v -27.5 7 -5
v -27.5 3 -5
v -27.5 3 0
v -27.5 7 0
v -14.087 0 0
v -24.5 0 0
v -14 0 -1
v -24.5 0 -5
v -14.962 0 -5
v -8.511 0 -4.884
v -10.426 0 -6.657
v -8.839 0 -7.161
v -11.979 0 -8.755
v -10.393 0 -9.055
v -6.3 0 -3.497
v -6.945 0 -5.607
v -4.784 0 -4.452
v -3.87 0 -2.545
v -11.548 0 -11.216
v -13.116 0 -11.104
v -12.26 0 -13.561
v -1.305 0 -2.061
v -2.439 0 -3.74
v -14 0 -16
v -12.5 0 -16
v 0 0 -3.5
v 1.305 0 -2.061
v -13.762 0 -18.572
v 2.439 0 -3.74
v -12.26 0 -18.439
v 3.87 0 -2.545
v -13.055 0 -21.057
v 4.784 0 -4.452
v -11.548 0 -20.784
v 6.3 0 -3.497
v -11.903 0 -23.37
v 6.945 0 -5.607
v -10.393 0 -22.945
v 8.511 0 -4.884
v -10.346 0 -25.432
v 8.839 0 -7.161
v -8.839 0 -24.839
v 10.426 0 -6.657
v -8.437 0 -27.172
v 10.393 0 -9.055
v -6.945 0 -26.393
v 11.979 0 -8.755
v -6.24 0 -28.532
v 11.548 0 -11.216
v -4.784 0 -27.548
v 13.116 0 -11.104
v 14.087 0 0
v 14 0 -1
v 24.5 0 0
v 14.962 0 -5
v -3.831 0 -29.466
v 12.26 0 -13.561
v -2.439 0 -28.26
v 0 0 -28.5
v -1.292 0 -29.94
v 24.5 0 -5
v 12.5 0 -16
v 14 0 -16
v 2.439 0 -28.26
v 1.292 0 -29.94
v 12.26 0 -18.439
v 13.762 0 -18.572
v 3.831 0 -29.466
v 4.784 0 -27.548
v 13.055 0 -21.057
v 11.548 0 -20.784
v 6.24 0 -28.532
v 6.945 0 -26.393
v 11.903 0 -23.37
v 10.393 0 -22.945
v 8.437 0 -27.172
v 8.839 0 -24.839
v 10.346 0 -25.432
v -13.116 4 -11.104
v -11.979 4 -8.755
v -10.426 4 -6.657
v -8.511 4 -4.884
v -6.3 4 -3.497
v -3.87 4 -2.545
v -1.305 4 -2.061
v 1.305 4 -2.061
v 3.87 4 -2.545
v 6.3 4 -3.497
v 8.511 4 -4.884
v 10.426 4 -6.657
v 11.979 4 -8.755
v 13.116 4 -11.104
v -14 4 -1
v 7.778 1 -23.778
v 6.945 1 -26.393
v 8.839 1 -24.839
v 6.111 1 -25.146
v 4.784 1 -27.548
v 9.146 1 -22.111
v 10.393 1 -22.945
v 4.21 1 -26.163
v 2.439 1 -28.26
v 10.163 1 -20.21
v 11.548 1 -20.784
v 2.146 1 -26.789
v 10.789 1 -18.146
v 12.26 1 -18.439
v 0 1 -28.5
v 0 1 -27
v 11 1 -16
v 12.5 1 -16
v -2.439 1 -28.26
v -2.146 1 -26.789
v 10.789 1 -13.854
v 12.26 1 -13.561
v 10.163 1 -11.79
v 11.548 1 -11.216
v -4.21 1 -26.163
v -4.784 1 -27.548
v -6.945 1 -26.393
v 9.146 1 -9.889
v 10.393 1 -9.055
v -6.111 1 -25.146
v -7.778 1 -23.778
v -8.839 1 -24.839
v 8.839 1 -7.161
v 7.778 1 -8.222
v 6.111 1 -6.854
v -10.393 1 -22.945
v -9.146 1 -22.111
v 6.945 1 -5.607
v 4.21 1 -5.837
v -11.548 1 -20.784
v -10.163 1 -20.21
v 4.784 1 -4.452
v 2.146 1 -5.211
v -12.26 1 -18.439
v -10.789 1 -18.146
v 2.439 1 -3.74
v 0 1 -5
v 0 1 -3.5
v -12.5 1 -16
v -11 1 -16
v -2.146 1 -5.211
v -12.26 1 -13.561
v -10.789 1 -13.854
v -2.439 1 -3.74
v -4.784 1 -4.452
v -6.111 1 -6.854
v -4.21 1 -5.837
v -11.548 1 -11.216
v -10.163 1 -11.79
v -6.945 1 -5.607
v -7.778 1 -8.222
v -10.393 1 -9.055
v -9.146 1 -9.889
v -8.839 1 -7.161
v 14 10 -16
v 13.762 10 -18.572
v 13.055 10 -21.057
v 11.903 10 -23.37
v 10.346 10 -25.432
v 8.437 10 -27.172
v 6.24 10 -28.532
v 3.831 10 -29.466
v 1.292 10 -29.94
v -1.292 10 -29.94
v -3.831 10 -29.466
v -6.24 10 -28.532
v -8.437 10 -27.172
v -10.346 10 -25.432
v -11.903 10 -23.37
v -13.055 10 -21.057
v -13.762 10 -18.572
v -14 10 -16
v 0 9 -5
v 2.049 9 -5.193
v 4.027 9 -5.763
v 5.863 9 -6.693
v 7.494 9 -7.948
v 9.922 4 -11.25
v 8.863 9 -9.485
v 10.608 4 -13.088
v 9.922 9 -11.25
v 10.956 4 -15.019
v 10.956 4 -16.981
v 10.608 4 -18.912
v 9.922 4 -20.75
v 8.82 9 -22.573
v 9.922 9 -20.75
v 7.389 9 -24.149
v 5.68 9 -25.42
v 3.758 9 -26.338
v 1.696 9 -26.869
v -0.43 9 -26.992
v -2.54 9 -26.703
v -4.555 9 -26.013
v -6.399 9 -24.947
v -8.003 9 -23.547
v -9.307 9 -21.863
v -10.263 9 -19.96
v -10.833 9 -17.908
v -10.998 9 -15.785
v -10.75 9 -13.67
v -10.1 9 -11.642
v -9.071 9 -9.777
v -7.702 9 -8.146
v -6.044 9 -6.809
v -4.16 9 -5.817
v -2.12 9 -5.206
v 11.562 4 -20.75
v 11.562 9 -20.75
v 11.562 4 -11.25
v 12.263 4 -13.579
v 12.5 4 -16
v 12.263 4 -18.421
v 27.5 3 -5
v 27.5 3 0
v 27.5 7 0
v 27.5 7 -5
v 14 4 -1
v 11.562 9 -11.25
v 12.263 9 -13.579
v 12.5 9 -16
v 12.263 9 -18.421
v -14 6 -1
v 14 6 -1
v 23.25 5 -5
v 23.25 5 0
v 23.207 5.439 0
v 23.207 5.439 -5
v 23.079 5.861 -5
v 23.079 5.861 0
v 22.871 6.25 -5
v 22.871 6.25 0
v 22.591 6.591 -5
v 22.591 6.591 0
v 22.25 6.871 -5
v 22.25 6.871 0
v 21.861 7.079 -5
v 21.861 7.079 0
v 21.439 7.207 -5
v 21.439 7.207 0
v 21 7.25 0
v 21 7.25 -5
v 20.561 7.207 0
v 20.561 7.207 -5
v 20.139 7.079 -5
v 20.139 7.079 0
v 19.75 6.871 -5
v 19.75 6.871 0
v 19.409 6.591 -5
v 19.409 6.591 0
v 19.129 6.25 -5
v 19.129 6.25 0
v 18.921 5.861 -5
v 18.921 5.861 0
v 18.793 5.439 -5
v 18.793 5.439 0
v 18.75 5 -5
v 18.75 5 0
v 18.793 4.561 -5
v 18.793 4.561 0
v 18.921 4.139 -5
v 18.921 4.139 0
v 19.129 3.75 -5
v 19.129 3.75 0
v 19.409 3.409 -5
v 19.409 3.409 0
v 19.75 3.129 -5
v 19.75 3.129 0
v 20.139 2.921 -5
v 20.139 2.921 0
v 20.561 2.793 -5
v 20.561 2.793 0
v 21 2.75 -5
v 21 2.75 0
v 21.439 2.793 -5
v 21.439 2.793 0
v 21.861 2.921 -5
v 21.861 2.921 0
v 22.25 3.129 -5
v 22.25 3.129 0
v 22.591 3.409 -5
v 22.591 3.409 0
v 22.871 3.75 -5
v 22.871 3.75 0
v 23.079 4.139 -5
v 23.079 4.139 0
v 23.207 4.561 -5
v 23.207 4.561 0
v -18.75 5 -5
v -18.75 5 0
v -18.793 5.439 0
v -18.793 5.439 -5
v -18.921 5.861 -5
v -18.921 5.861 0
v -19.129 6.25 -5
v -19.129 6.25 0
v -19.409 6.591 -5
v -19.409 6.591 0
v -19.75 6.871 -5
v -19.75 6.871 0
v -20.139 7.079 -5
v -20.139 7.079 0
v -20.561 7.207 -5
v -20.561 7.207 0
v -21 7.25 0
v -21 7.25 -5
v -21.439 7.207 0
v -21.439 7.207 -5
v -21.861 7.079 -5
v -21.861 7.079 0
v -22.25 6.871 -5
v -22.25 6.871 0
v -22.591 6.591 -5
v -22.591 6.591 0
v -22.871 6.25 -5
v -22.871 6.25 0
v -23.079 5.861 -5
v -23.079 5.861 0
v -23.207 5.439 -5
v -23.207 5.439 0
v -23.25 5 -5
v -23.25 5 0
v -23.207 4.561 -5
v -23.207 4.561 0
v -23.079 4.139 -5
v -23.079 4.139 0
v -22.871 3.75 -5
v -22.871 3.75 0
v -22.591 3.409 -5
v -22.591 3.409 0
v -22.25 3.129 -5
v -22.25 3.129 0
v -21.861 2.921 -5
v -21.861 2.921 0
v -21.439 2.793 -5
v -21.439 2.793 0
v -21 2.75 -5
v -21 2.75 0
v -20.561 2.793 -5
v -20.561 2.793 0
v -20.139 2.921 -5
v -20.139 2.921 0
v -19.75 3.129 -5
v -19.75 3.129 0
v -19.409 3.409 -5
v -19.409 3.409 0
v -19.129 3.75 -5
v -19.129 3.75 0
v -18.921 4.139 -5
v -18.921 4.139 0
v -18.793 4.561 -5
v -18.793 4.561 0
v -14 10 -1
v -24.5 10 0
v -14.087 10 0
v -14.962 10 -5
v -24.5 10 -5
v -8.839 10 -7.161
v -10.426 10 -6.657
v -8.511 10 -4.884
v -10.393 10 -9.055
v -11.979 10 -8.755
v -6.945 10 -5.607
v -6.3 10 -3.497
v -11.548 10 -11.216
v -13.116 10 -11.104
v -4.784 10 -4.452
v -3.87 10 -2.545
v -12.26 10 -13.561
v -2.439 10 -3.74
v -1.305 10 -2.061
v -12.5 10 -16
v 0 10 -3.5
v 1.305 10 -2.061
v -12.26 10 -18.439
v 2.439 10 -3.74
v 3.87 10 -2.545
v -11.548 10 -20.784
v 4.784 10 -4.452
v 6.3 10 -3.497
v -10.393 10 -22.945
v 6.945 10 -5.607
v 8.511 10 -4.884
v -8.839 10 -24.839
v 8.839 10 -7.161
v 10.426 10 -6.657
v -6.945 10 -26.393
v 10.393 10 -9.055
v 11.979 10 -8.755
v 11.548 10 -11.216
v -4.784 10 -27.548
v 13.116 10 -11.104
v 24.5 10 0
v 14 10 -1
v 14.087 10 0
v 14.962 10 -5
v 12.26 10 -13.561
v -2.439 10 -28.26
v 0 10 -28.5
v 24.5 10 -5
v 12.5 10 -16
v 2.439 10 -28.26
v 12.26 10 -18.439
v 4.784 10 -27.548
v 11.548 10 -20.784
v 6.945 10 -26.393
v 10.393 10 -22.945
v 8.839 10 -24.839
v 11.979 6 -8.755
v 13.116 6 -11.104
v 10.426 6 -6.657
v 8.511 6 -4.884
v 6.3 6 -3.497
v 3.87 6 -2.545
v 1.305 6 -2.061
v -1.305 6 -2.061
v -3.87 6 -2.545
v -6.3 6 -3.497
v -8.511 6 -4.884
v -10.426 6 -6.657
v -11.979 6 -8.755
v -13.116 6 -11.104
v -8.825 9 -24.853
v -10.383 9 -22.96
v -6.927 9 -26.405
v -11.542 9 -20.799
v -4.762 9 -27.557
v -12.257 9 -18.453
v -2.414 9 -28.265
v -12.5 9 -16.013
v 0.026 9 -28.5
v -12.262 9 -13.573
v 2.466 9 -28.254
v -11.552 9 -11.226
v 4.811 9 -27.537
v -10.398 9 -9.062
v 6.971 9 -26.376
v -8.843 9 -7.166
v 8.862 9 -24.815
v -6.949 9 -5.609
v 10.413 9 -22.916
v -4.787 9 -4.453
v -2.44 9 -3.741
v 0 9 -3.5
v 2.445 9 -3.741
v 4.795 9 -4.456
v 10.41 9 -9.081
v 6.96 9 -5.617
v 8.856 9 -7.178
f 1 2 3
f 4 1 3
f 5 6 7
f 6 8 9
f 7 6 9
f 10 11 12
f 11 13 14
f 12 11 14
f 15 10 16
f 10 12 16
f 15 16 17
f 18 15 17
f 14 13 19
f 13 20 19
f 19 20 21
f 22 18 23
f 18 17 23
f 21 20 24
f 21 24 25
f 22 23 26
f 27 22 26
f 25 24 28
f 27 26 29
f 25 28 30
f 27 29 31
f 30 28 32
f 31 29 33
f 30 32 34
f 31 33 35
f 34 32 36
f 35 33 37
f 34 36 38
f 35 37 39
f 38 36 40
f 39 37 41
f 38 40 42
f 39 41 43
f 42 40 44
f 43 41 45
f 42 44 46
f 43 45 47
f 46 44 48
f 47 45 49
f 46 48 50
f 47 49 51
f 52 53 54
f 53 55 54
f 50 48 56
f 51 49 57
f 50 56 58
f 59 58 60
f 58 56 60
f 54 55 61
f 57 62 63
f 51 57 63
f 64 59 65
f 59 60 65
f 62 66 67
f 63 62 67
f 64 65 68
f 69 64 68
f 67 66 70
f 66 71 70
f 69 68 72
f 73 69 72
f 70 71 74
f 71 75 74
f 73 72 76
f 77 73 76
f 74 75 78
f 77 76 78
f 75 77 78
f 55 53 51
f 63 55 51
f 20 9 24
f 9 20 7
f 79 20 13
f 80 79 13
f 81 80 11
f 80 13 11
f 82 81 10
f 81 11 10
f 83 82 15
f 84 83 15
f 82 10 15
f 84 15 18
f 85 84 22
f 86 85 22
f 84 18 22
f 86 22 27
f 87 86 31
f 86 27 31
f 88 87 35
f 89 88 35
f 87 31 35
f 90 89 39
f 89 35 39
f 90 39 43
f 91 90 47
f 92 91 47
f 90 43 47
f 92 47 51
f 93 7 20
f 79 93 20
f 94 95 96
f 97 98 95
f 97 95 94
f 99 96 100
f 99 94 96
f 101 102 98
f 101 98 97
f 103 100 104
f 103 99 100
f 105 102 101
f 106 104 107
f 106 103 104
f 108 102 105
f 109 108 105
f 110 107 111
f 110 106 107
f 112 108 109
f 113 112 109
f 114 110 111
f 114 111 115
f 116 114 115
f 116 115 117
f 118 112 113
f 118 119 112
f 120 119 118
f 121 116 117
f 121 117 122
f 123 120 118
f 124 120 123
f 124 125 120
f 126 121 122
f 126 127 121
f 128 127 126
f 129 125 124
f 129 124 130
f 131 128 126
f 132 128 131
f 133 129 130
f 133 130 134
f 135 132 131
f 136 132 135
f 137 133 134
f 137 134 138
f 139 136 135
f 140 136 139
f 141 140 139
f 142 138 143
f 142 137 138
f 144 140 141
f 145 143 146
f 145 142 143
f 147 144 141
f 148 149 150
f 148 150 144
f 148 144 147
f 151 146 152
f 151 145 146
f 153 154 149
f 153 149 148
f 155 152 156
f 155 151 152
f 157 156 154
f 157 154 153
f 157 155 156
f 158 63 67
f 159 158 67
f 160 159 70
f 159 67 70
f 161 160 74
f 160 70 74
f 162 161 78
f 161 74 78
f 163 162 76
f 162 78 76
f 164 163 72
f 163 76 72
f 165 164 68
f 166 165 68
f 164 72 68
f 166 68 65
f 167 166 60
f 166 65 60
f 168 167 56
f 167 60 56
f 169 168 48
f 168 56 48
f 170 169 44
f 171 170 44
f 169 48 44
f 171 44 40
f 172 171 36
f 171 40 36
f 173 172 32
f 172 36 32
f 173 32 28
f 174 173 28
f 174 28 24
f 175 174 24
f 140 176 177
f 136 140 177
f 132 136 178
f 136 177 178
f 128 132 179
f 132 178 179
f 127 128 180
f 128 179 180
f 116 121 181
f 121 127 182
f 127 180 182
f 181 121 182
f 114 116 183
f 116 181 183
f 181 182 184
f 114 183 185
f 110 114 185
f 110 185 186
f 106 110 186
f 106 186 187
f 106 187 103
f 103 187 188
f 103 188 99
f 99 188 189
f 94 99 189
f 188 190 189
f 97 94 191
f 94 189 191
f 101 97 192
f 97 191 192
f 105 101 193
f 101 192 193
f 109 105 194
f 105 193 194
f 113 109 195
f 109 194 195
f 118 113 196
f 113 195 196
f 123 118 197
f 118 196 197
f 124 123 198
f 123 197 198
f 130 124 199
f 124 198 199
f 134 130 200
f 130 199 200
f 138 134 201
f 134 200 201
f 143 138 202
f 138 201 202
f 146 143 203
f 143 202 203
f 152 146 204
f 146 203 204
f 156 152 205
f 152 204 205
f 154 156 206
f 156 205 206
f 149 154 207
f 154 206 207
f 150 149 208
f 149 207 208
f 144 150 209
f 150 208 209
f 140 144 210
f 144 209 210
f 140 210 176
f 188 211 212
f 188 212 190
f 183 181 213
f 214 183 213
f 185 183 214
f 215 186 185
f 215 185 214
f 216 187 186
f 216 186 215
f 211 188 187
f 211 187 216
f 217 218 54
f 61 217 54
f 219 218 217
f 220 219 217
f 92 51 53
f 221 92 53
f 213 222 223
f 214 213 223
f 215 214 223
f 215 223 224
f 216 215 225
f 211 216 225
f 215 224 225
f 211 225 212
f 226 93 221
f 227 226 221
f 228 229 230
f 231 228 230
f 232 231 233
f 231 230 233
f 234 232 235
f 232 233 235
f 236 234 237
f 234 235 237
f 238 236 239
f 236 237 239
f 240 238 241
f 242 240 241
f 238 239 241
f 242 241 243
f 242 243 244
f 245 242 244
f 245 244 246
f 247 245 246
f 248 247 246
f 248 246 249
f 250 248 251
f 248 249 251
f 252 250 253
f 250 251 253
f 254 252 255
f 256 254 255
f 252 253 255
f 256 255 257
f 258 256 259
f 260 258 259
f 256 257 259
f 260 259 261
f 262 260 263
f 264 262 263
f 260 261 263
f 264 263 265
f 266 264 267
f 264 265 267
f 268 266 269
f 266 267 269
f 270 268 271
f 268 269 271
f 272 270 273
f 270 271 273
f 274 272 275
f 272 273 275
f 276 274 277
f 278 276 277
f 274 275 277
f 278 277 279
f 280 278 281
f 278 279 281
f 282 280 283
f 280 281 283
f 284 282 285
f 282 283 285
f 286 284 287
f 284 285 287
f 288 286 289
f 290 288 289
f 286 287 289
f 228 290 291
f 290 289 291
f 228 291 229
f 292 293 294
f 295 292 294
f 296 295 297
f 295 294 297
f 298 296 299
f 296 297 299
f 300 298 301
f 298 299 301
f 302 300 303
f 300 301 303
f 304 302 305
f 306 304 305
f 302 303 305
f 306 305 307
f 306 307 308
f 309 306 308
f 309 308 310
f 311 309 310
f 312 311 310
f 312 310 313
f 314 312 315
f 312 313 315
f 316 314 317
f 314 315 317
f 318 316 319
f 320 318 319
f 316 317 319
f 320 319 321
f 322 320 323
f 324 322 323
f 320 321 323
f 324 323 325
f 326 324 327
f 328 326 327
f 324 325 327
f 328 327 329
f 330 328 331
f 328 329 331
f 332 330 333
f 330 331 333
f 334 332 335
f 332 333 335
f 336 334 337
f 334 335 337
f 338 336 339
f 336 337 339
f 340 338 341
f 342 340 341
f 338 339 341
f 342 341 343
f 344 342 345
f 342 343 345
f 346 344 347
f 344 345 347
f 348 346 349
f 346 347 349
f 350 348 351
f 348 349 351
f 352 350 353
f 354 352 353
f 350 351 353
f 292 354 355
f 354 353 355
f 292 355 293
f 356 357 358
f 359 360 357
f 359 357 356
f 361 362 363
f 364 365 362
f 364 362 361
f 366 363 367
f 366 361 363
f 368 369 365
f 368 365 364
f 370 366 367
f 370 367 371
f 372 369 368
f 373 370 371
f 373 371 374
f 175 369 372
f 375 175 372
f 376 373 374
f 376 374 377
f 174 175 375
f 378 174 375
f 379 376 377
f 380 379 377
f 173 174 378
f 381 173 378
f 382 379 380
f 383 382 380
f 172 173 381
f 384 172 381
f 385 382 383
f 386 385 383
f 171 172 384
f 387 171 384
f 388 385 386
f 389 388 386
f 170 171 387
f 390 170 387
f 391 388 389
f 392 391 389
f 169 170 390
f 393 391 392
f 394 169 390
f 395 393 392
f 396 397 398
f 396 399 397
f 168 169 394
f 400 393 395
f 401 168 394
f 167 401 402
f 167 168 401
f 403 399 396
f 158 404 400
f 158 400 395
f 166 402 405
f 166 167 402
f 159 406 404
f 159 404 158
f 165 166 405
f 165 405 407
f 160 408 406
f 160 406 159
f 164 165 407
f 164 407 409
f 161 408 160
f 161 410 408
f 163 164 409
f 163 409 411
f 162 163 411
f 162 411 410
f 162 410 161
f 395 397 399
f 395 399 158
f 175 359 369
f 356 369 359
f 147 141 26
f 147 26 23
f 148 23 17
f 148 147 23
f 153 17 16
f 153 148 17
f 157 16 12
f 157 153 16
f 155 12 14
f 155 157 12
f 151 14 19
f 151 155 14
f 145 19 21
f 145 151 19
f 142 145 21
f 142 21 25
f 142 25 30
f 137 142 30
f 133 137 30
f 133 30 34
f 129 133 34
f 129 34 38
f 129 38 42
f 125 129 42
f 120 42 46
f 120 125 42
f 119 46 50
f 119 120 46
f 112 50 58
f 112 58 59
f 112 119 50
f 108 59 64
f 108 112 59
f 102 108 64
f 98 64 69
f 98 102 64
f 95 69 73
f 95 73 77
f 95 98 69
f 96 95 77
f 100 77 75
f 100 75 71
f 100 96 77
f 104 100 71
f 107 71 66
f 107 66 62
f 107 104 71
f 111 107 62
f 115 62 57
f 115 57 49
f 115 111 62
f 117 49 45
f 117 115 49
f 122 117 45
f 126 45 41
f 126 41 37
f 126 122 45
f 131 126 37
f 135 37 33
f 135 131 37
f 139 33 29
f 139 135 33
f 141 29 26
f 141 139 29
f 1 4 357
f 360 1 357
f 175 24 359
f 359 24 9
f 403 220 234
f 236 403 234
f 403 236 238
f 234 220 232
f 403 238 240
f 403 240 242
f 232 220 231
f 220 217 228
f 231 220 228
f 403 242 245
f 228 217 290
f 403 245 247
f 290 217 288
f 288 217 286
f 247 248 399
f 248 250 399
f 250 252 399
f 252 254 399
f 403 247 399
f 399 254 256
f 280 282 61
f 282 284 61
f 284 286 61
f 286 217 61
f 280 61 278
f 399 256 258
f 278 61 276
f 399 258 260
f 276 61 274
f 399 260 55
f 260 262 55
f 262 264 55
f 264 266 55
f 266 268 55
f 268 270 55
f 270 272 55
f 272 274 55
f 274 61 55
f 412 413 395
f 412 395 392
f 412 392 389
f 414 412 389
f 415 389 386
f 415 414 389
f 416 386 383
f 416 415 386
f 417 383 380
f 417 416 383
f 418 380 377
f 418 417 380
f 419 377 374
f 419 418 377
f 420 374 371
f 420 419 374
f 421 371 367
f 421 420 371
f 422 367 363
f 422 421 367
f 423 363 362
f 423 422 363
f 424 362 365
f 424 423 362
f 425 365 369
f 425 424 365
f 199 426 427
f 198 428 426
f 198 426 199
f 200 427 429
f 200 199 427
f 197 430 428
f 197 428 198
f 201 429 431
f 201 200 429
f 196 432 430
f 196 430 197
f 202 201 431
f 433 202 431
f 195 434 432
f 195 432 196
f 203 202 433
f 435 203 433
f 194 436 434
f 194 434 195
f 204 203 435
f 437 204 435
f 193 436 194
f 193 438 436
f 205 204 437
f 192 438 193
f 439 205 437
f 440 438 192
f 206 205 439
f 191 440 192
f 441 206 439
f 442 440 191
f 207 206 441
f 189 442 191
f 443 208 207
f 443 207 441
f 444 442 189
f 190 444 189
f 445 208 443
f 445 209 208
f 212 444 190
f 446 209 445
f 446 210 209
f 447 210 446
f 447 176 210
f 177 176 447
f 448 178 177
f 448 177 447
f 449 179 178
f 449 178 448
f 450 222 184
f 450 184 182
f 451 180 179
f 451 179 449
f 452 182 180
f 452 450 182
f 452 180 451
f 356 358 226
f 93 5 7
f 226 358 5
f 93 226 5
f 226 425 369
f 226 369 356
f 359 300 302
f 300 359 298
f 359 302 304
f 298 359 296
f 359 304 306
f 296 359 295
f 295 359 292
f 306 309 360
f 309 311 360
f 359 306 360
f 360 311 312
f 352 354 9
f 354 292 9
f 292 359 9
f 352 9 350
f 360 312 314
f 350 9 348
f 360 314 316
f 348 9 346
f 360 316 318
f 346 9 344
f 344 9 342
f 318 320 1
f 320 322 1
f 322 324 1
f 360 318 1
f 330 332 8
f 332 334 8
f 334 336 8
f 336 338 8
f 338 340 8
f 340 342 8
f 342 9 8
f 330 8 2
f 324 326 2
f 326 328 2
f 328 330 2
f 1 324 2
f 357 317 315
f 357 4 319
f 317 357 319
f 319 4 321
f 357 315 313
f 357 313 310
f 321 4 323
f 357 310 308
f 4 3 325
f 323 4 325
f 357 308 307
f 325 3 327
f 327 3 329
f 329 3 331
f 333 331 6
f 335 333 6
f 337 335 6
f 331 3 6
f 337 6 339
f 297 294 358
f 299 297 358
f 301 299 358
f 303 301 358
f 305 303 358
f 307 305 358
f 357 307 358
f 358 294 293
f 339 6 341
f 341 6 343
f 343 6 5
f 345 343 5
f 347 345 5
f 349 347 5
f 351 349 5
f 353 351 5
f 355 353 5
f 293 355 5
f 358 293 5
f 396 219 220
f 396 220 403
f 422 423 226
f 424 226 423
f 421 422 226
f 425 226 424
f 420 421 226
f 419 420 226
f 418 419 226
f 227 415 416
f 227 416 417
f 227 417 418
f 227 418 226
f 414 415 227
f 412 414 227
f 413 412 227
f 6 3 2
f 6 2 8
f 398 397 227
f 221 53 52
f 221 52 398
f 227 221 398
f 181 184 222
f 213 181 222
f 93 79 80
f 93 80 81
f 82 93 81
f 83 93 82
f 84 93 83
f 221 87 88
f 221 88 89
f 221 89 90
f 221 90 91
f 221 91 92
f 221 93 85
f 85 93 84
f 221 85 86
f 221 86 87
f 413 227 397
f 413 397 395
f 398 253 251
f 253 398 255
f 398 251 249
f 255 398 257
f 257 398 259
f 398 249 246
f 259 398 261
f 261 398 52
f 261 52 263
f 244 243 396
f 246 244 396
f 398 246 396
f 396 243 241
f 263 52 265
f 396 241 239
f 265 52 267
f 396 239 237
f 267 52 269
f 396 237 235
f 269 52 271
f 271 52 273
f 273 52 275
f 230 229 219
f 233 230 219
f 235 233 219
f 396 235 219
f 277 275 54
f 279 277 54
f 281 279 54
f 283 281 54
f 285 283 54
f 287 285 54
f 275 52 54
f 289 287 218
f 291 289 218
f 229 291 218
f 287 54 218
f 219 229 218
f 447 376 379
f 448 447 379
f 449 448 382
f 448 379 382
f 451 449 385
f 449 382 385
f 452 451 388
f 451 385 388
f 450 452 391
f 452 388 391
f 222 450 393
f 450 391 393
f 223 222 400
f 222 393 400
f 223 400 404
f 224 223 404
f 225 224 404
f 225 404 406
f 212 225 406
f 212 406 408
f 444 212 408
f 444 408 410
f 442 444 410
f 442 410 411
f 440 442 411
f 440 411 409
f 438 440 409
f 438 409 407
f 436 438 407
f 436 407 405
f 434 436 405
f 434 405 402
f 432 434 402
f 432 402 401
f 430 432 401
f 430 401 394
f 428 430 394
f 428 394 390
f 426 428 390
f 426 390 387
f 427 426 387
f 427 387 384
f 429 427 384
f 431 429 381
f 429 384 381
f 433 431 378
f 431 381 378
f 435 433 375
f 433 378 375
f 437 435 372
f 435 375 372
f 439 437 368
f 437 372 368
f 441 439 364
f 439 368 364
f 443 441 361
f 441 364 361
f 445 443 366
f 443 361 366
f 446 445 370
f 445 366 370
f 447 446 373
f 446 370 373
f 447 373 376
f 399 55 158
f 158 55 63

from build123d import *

# Parameters (mm, degrees)
BOSS_EXTRU_1_DEPTH      = 10
ESQUISSE3_R             = 2.25
ENL_V_MAT_EXTRU_1_DEPTH = 5
ESQUISSE5_R             = 11
ENL_V_MAT_EXTRU_2_DEPTH = 10
ESQUISSE6_R             = 12.5
ENL_V_MAT_EXTRU_3_DEPTH = 1
ENL_V_START             = -1
ESQUISSE7_R             = 12.5
ENL_V_MAT_EXTRU_4_DEPTH = 1
ENL_V_MAT_EXTRU_5_DEPTH = 5
ENL_V_START_2           = -4
ENL_V_MAT_EXTRU_6_DEPTH = 4
ENL_V_MAT_EXTRU_7_DEPTH = 4


with BuildPart() as part:
    # Esquisse2 → Boss.-Extru.1 (new body)
    with BuildSketch(Plane(origin=(0, 0, 0), x_dir=(1, 0, 0), z_dir=(0, 1, 0))):
        with BuildLine():
            Line((14.087488664, 0), (27.5, 0))
            Line((27.5, 0), (27.5, 5))
            Line((27.5, 5), (14.962375299, 5))
            Line((14.962375299, 5), (14, 16))
            ThreePointArc((14, 16), (0, 30), (-14, 16))
            Line((-14, 16), (-14.962375299, 5))
            Line((-14.962375299, 5), (-27.5, 5))
            Line((-27.5, 5), (-27.5, 0))
            Line((-27.5, 0), (-14.087488664, 0))
            Line((-14.087488664, 0), (-14, 1))
            Line((-14, 1), (14, 1))
            Line((14, 1), (14.087488664, 0))
        make_face()
    extrude(amount=BOSS_EXTRU_1_DEPTH)

    # Esquisse3 → Enlèv. mat.-Extru.1 (cut)
    with BuildSketch(Plane.XY):
        with Locations((-21, 5)):
            Circle(ESQUISSE3_R)
        with Locations((21, 5)):
            Circle(ESQUISSE3_R)
        Polygon((-27.5, 3), (-24.5, 0), (-27.5, 0), align=None)
        Polygon((-27.5, 10), (-27.5, 7), (-24.5, 10), align=None)
        Polygon((27.5, 7), (24.5, 10), (27.5, 10), align=None)
        Polygon((27.5, 3), (24.5, 0), (27.5, 0), align=None)
    extrude(amount=-ENL_V_MAT_EXTRU_1_DEPTH, mode=Mode.SUBTRACT)

    # Esquisse5 → Enlèv. mat.-Extru.2 (cut)
    with BuildSketch(Plane(origin=(0, 10, 0), x_dir=(1, 0, 0), z_dir=(0, 1, 0))):
        with Locations(Location((0, 16, 0), (0, 0, 270))):
            Circle(ESQUISSE5_R)
    extrude(amount=-ENL_V_MAT_EXTRU_2_DEPTH, mode=Mode.SUBTRACT)

    # Esquisse6 → Enlèv. mat.-Extru.3 (cut)
    with BuildSketch(Plane(origin=(0, 10, 0), x_dir=(1, 0, 0), z_dir=(0, 1, 0))):
        with Locations(Location((0, 16, 0), (0, 0, 270))):
            Circle(ESQUISSE6_R)
    extrude(amount=-ENL_V_MAT_EXTRU_3_DEPTH, mode=Mode.SUBTRACT)

    # Esquisse7 → Enlèv. mat.-Extru.4 (cut)
    with BuildSketch(Plane.XZ.offset(ENL_V_START)):
        with Locations(Location((0, -16, 0), (0, 0, 90))):
            Circle(ESQUISSE7_R)
    extrude(amount=ENL_V_MAT_EXTRU_4_DEPTH, mode=Mode.SUBTRACT)

    # Esquisse8 → Enlèv. mat.-Extru.5 (cut)
    with BuildSketch(Plane(origin=(0, 9, 0), x_dir=(1, 0, 0), z_dir=(0, 1, 0))):
        with BuildLine():
            Line((11.56233108, 20.75), (9.921567416, 20.75))
            ThreePointArc((9.921567416, 20.75), (11, 16), (9.921567416, 11.25))
            Line((9.921567416, 11.25), (11.56233108, 11.25))
            ThreePointArc((11.56233108, 11.25), (12.5, 16), (11.56233108, 20.75))
        make_face()
    extrude(amount=-ENL_V_MAT_EXTRU_5_DEPTH, mode=Mode.SUBTRACT)

    # Esquisse9 → Enlèv. mat.-Extru.6 (cut)
    with BuildSketch(Plane(origin=(0, 10, 0), x_dir=(1, 0, 0), z_dir=(0, 1, 0)).offset(ENL_V_START_2)):
        with BuildLine():
            Line((14, 1), (13.116009813, 11.104054068))
            ThreePointArc((13.116009813, 11.104054068), (0, 2), (-13.116009813, 11.104054068))
            Line((-13.116009813, 11.104054068), (-14, 1))
            Line((-14, 1), (14, 1))
        make_face()
    extrude(amount=ENL_V_MAT_EXTRU_6_DEPTH, mode=Mode.SUBTRACT)

    # Esquisse10 → Enlèv. mat.-Extru.7 (cut)
    with BuildSketch(Plane.XZ):
        with BuildLine():
            Line((13.116009813, -11.104054068), (14, -1))
            Line((14, -1), (-14, -1))
            Line((-14, -1), (-13.116009813, -11.104054068))
            ThreePointArc((-13.116009813, -11.104054068), (0, -2), (13.116009813, -11.104054068))
        make_face()
    extrude(amount=-ENL_V_MAT_EXTRU_7_DEPTH, mode=Mode.SUBTRACT)


solid = part.part
